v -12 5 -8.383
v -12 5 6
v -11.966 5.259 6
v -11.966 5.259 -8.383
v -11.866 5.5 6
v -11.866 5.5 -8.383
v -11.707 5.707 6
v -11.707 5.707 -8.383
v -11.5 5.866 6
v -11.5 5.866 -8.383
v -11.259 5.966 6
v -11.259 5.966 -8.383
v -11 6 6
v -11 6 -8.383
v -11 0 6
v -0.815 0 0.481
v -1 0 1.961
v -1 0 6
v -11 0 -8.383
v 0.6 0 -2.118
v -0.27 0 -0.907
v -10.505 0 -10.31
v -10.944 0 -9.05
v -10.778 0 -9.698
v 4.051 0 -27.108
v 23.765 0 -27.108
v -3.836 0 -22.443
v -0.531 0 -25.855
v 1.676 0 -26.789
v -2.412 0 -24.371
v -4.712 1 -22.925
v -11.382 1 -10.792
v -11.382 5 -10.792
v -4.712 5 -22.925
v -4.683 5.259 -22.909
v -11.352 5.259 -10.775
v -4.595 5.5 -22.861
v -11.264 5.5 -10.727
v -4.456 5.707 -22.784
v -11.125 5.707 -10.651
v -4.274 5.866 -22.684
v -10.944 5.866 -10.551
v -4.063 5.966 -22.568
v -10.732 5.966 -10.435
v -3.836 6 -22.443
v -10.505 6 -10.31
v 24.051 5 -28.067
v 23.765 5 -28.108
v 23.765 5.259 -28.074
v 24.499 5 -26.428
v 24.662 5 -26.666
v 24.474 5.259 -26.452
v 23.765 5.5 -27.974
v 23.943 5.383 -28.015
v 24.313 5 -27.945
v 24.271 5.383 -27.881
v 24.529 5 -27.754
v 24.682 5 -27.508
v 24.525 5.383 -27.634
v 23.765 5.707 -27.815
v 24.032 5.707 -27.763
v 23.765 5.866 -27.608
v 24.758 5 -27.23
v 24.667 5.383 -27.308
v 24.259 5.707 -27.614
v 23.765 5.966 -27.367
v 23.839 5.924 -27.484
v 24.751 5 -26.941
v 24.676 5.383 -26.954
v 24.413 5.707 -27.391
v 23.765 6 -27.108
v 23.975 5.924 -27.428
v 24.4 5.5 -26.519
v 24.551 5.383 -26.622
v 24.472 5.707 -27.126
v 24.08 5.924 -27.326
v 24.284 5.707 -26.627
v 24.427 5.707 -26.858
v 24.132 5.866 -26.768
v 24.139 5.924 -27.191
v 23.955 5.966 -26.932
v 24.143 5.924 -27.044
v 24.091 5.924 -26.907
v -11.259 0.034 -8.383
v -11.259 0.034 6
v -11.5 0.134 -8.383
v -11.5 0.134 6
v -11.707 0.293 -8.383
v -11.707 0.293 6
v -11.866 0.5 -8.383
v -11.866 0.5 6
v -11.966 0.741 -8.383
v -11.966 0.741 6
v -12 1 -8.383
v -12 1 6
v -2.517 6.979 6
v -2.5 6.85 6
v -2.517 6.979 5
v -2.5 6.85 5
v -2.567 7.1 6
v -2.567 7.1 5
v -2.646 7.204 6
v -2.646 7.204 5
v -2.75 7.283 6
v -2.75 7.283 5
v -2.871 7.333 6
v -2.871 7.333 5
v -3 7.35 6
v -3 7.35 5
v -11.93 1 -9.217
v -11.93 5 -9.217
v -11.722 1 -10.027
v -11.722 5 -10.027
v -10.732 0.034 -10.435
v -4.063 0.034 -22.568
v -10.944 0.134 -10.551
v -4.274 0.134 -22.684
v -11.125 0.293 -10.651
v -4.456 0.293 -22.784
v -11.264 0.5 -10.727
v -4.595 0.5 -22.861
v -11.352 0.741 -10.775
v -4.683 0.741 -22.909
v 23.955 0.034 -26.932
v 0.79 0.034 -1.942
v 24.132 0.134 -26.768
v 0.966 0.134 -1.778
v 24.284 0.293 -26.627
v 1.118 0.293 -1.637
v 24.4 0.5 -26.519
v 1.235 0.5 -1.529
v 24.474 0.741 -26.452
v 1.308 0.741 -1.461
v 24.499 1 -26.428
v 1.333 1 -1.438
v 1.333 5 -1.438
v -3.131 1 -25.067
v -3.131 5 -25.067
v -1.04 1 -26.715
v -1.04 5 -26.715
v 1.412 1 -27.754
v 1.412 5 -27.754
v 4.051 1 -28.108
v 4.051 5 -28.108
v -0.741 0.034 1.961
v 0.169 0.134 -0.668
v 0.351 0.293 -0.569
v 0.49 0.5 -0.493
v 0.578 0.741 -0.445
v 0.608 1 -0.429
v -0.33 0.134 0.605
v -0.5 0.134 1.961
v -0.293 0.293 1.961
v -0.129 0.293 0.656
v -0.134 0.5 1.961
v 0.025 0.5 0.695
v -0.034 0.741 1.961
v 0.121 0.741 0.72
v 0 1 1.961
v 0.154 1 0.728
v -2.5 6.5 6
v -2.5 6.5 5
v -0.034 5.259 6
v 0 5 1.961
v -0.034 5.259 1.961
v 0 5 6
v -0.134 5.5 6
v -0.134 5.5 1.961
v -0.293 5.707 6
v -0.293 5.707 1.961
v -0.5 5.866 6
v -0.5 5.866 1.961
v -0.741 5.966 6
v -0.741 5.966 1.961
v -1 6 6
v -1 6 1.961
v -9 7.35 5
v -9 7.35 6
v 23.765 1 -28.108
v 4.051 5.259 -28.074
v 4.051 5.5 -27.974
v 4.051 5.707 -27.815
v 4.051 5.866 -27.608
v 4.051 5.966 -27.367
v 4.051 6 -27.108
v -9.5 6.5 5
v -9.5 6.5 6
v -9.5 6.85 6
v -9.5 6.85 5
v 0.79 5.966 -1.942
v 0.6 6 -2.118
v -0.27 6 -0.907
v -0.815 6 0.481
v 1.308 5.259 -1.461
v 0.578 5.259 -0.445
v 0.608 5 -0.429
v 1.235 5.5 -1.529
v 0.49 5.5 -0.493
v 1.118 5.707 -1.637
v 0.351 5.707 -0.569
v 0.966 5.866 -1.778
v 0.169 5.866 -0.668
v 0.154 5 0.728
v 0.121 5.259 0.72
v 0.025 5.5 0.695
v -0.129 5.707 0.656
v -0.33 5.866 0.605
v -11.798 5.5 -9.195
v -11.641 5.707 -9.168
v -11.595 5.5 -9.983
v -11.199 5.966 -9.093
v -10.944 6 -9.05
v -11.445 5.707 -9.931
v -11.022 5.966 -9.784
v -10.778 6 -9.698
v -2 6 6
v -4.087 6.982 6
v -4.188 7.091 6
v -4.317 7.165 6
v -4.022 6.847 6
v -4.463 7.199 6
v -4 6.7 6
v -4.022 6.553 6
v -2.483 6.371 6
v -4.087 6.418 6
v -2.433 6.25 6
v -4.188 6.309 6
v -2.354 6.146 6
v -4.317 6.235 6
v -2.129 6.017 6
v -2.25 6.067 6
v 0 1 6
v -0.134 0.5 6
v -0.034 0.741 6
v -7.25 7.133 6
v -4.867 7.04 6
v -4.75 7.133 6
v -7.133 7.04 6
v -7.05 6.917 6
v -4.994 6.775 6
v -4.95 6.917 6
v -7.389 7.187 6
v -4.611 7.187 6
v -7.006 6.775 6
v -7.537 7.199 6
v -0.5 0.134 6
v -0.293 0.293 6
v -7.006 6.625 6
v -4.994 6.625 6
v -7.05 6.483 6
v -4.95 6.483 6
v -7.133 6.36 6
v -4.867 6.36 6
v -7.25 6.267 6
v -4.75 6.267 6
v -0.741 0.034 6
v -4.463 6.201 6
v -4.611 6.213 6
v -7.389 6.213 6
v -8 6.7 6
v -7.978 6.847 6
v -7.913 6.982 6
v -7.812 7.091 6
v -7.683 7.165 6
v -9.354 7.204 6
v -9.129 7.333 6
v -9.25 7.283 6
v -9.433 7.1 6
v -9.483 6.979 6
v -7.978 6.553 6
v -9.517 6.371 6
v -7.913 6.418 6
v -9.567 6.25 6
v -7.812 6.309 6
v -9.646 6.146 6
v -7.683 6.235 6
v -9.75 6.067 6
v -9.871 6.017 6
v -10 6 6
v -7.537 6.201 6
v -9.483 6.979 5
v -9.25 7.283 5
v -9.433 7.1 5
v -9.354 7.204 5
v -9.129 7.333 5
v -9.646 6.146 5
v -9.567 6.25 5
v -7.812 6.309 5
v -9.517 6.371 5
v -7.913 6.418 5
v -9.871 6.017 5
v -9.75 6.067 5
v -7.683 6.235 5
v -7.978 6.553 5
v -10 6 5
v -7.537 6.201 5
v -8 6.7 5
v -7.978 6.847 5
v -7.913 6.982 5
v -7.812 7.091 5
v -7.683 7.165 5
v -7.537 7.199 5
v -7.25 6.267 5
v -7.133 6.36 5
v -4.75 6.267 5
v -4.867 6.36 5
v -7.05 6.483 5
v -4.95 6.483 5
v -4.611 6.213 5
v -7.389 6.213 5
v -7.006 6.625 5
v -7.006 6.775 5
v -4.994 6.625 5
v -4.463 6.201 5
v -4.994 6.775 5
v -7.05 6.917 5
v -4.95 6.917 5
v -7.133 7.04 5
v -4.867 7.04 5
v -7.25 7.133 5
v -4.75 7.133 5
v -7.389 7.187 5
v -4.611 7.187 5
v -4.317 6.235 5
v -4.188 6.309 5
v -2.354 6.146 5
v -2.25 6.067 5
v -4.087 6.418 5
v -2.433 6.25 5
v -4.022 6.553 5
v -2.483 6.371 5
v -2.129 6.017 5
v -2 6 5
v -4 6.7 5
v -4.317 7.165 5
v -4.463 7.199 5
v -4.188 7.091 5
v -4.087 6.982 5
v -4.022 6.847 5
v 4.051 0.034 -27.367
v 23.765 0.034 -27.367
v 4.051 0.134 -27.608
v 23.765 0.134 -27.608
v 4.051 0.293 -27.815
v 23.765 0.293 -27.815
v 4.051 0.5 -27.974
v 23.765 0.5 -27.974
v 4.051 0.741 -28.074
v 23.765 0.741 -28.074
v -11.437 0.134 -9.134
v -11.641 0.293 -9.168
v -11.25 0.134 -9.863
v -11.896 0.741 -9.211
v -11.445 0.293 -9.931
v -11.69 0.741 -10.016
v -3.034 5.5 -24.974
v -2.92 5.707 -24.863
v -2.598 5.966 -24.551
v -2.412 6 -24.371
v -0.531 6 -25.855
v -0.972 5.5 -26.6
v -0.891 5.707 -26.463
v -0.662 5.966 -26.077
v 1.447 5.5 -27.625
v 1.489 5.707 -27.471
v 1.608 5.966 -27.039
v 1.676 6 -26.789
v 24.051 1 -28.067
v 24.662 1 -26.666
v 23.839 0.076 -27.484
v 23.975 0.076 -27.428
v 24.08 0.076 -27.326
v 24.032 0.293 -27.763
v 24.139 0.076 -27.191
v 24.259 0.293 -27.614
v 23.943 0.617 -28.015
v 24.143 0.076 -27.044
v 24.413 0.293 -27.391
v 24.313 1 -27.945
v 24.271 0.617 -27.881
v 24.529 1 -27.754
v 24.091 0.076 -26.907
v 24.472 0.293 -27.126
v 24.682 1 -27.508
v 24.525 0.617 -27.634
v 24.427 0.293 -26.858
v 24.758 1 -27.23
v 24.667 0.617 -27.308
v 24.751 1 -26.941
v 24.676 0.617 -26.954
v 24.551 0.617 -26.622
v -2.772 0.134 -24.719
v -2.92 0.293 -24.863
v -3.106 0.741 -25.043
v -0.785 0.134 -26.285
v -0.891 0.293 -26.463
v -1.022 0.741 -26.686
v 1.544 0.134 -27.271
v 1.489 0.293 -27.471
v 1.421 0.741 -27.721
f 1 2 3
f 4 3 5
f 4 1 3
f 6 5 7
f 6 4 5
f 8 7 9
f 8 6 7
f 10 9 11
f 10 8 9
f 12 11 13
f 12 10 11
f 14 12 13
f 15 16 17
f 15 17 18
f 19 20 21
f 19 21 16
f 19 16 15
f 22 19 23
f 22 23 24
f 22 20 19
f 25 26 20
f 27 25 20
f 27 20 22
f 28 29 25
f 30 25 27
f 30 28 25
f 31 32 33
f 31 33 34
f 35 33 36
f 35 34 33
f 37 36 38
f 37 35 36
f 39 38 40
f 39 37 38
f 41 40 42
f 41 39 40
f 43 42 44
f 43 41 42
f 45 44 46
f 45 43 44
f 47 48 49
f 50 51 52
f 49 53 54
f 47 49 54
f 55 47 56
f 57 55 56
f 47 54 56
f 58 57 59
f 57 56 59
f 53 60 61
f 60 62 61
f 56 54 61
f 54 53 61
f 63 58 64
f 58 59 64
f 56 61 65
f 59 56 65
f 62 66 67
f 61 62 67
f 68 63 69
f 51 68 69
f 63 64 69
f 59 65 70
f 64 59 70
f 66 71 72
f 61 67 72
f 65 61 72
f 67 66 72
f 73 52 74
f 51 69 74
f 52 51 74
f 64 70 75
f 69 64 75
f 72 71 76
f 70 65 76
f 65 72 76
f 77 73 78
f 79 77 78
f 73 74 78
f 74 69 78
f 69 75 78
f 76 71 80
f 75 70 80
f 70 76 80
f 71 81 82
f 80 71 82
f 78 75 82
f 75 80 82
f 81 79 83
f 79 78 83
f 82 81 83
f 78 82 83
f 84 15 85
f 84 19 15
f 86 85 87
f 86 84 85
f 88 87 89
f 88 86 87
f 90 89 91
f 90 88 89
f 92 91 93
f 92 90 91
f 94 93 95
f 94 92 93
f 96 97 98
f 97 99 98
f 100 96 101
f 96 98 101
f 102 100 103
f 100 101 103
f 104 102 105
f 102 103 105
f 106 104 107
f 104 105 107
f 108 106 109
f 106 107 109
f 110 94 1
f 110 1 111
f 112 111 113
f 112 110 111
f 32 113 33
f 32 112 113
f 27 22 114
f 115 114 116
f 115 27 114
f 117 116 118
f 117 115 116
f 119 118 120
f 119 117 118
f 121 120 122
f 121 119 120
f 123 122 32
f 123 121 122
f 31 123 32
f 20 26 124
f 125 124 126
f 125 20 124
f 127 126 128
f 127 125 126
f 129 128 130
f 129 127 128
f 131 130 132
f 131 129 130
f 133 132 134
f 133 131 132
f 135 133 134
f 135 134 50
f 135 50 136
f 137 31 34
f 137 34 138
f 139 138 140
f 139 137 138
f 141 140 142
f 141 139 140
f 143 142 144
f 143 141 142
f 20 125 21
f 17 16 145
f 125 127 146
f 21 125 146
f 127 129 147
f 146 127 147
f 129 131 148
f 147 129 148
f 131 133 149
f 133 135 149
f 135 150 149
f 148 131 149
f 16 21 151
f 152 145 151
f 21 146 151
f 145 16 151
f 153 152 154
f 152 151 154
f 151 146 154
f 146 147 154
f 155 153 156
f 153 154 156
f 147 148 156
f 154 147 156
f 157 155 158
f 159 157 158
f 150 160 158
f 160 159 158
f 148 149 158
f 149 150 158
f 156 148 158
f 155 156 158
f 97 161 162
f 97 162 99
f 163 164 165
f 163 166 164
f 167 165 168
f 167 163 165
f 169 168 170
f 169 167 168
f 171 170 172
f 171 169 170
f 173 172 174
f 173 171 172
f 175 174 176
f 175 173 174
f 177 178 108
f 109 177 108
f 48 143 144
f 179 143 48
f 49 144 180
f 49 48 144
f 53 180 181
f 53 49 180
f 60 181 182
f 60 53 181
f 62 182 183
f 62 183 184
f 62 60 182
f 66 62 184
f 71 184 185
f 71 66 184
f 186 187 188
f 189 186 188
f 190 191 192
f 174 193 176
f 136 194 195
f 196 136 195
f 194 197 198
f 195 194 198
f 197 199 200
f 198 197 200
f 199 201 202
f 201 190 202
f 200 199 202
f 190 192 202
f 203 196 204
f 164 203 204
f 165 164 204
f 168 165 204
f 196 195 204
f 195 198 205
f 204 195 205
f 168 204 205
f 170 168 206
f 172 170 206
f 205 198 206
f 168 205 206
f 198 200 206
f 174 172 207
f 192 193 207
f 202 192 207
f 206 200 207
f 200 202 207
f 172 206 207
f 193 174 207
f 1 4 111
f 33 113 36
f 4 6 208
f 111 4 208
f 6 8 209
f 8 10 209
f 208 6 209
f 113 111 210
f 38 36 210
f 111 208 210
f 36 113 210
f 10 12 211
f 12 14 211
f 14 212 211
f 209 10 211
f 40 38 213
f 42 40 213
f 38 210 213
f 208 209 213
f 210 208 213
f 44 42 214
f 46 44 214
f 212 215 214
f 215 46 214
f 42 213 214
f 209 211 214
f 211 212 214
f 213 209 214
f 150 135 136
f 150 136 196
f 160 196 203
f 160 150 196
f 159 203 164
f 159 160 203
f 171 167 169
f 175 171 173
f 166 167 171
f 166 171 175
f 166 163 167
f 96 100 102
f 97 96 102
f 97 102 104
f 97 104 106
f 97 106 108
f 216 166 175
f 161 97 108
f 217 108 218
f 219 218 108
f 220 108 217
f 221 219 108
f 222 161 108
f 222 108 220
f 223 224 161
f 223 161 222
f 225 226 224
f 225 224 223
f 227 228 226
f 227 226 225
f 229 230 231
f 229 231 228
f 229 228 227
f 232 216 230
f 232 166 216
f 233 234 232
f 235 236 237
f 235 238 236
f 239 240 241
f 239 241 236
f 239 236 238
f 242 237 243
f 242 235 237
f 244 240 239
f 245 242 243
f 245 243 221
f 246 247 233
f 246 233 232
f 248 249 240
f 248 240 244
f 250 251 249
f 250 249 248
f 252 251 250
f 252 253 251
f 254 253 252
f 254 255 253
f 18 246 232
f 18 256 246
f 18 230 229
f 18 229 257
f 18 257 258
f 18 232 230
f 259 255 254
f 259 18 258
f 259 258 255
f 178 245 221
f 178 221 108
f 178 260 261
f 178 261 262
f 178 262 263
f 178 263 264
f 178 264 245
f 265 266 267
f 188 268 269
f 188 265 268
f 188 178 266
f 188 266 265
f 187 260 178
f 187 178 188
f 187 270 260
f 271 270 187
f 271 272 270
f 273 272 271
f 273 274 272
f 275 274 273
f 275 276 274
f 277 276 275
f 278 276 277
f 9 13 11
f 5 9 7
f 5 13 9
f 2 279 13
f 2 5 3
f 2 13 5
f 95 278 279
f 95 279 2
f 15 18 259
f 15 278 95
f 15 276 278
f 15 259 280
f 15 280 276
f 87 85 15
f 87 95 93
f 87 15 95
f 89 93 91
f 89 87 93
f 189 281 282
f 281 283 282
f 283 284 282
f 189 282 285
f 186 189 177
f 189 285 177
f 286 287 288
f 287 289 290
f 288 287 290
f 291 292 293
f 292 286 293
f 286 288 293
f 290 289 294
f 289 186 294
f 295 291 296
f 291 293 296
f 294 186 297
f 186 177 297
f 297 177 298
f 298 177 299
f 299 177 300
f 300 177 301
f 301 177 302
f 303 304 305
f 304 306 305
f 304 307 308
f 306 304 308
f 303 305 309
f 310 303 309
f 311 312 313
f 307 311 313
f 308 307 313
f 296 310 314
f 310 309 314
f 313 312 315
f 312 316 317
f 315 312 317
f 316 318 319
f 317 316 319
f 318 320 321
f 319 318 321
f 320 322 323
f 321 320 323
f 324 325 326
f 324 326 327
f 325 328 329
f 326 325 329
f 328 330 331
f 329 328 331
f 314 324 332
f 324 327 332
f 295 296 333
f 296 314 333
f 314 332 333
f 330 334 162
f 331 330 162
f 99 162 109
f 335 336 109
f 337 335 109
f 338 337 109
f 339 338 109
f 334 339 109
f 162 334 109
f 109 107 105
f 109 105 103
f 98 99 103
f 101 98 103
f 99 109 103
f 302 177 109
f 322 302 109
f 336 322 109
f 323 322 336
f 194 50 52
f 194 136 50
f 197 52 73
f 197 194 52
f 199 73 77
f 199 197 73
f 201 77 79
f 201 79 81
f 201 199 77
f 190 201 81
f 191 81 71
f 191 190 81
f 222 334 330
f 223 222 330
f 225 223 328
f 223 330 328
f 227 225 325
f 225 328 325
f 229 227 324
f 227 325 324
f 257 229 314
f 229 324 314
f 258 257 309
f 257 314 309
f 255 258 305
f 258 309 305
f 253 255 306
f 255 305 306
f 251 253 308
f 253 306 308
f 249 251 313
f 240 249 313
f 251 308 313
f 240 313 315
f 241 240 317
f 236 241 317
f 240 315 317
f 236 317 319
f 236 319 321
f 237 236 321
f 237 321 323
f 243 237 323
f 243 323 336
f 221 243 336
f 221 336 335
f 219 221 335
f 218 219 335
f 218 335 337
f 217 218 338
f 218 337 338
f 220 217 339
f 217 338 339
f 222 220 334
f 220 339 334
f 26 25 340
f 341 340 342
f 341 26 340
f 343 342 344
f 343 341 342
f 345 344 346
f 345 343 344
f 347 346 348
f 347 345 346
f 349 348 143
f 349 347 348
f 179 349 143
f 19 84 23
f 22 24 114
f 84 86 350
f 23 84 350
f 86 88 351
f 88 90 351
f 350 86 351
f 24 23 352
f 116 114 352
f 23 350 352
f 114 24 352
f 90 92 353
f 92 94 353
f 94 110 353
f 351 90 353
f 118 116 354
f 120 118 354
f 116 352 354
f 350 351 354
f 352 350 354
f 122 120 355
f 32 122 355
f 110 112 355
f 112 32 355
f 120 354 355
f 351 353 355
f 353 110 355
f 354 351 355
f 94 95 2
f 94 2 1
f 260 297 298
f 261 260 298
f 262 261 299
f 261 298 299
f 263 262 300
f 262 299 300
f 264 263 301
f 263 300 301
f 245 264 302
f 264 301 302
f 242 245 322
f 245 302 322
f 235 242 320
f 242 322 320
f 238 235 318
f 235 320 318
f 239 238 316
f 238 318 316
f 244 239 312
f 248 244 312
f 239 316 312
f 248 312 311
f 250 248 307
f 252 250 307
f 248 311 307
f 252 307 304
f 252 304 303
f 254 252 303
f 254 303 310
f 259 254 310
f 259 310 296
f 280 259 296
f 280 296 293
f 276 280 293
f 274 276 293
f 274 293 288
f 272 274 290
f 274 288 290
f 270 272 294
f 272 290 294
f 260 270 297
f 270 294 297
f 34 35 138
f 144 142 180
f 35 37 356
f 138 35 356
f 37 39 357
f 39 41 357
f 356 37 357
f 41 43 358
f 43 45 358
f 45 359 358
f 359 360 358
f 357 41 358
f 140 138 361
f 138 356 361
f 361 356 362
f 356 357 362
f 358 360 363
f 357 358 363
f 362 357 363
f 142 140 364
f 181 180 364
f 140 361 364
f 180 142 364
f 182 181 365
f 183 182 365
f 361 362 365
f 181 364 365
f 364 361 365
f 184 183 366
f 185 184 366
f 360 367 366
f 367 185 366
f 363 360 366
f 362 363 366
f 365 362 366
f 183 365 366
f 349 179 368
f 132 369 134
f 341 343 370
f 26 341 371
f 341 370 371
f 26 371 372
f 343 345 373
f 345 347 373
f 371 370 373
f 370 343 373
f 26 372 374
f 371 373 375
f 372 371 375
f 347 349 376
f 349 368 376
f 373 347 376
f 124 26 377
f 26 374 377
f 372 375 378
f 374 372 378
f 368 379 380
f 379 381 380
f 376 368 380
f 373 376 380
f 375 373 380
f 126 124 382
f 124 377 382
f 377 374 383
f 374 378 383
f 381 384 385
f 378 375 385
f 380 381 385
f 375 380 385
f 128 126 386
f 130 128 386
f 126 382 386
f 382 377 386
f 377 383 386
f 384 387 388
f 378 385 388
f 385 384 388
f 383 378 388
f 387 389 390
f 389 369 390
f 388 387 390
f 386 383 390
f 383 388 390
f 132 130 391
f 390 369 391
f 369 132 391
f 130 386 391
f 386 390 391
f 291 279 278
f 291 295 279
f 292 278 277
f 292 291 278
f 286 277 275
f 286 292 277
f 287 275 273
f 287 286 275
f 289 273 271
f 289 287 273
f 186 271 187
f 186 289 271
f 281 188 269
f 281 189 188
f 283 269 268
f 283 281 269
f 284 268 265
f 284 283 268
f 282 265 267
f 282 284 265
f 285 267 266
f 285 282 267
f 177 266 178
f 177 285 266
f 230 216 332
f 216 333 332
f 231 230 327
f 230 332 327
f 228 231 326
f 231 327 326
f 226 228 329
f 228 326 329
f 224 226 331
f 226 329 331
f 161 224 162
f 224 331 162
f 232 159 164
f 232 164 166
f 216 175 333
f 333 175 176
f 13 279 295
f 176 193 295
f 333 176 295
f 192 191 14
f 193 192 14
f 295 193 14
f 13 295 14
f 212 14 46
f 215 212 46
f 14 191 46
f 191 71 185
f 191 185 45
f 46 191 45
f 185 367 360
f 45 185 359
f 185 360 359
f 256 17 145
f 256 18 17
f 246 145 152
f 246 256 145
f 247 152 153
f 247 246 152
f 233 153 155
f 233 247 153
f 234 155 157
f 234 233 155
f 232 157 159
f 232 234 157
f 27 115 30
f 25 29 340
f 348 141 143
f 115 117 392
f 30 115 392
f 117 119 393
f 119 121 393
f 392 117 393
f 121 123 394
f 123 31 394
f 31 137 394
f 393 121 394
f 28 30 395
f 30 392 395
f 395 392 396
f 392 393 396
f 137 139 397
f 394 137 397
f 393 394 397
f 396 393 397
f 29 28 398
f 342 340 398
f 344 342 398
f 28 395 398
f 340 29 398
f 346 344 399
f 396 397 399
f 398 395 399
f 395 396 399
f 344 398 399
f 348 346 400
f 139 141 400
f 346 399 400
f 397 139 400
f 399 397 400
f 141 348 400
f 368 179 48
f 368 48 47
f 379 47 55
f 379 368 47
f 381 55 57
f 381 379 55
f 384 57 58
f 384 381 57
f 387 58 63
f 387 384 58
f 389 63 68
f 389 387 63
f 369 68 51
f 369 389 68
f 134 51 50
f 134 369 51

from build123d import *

# Parameters (mm, degrees)
BOSS_EXTRUDE1_DEPTH = 6
FILLET1_R           = 1
FILLET2_R           = 1
SKETCH3_W           = 7
SKETCH3_H           = 1.35
BOSS_EXTRUDE2_DEPTH = 1
FILLET4_R           = 0.5
SKETCH4_R           = 0.5
CUT_EXTRUDE1_DEPTH  = 1


with BuildPart() as part:
    # Sketch1 → Boss-Extrude1 (new body)
    with BuildSketch(Plane(origin=(0, 0, 0), x_dir=(1, 0, 0), z_dir=(0, 1, 0))):
        with BuildLine():
            Line((-11.381708203, 10.791631839), (-4.712422066, 22.925104071))
            ThreePointArc((-4.712422066, 22.925104071), (-1.039732152, 26.715438863), (4.050994341, 28.108203315))
            Line((4.050994341, 28.108203315), (23.765326904, 28.108203315))
            ThreePointArc((23.765326904, 28.108203315), (24.68179457, 27.508312073), (24.498700382, 26.428377351))
            Line((24.498700382, 26.428377351), (1.333132609, 1.438138803))
            ThreePointArc((1.333132609, 1.438138803), (0.345199416, -0.135386591), (0, -1.960991017))
            Line((0, -1.960991017), (0, -6))
            Line((0, -6), (-12, -6))
            Line((-12, -6), (-12, 8.383181461))
            ThreePointArc((-12, 8.383181461), (-11.842960924, 9.626455161), (-11.381708203, 10.791631839))
        make_face()
    extrude(amount=BOSS_EXTRUDE1_DEPTH)

    # Fillet1
    fillet1_edges = [part.edges().sort_by_distance(p)[0] for p in [
        (-11.842960924, 6, -9.626455161),
        (-12, 6, -1.191590731),
        (0, 6, 3.980495509),
        (0.345199416, 6, 0.135386591),
        (12.915916496, 6, -13.933258077),
        (24.68179457, 6, -27.508312073),
        (13.908160623, 6, -28.108203315),
        (-1.039732152, 6, -26.715438863),
        (-8.047065134, 6, -16.858367955),
    ]]
    fillet(fillet1_edges, radius=FILLET1_R)

    # Fillet2
    fillet2_edges = [part.edges().sort_by_distance(p)[0] for p in [
        (12.915916496, 0, -13.933258077),
        (0.345199416, 0, 0.135386591),
        (0, 0, 3.980495509),
        (-12, 0, -1.191590731),
        (-11.842960924, 0, -9.626455161),
        (-8.047065134, 0, -16.858367955),
        (-1.039732152, 0, -26.715438863),
        (13.908160623, 0, -28.108203315),
        (24.68179457, 0, -27.508312073),
    ]]
    fillet(fillet2_edges, radius=FILLET2_R)

    # Sketch3 → Boss-Extrude2 (add)
    with BuildSketch(Plane.XY.offset(6)):
        with Locations((-6, 6.675)):
            Rectangle(SKETCH3_W, SKETCH3_H)
    extrude(amount=-BOSS_EXTRUDE2_DEPTH)

    # Fillet4
    fillet4_edges = [part.edges().sort_by_distance(p)[0] for p in [
        (-2.5, 6, 5.5),
        (-9.5, 6, 5.5),
        (-9.5, 7.35, 5.5),
        (-2.5, 7.35, 5.5),
    ]]
    fillet(fillet4_edges, radius=FILLET4_R)

    # Sketch4 → Cut-Extrude1 (cut)
    with BuildSketch(Plane(origin=(0, 0, 5), x_dir=(-1, 0, 0), z_dir=(0, 0, -1))):
        with Locations((7.5, 6.7)):
            Circle(SKETCH4_R)
        with Locations(Location((4.5, 6.7, 0), (0, 0, 180))):
            Circle(SKETCH4_R)
    extrude(amount=-CUT_EXTRUDE1_DEPTH, mode=Mode.SUBTRACT)


solid = part.part
